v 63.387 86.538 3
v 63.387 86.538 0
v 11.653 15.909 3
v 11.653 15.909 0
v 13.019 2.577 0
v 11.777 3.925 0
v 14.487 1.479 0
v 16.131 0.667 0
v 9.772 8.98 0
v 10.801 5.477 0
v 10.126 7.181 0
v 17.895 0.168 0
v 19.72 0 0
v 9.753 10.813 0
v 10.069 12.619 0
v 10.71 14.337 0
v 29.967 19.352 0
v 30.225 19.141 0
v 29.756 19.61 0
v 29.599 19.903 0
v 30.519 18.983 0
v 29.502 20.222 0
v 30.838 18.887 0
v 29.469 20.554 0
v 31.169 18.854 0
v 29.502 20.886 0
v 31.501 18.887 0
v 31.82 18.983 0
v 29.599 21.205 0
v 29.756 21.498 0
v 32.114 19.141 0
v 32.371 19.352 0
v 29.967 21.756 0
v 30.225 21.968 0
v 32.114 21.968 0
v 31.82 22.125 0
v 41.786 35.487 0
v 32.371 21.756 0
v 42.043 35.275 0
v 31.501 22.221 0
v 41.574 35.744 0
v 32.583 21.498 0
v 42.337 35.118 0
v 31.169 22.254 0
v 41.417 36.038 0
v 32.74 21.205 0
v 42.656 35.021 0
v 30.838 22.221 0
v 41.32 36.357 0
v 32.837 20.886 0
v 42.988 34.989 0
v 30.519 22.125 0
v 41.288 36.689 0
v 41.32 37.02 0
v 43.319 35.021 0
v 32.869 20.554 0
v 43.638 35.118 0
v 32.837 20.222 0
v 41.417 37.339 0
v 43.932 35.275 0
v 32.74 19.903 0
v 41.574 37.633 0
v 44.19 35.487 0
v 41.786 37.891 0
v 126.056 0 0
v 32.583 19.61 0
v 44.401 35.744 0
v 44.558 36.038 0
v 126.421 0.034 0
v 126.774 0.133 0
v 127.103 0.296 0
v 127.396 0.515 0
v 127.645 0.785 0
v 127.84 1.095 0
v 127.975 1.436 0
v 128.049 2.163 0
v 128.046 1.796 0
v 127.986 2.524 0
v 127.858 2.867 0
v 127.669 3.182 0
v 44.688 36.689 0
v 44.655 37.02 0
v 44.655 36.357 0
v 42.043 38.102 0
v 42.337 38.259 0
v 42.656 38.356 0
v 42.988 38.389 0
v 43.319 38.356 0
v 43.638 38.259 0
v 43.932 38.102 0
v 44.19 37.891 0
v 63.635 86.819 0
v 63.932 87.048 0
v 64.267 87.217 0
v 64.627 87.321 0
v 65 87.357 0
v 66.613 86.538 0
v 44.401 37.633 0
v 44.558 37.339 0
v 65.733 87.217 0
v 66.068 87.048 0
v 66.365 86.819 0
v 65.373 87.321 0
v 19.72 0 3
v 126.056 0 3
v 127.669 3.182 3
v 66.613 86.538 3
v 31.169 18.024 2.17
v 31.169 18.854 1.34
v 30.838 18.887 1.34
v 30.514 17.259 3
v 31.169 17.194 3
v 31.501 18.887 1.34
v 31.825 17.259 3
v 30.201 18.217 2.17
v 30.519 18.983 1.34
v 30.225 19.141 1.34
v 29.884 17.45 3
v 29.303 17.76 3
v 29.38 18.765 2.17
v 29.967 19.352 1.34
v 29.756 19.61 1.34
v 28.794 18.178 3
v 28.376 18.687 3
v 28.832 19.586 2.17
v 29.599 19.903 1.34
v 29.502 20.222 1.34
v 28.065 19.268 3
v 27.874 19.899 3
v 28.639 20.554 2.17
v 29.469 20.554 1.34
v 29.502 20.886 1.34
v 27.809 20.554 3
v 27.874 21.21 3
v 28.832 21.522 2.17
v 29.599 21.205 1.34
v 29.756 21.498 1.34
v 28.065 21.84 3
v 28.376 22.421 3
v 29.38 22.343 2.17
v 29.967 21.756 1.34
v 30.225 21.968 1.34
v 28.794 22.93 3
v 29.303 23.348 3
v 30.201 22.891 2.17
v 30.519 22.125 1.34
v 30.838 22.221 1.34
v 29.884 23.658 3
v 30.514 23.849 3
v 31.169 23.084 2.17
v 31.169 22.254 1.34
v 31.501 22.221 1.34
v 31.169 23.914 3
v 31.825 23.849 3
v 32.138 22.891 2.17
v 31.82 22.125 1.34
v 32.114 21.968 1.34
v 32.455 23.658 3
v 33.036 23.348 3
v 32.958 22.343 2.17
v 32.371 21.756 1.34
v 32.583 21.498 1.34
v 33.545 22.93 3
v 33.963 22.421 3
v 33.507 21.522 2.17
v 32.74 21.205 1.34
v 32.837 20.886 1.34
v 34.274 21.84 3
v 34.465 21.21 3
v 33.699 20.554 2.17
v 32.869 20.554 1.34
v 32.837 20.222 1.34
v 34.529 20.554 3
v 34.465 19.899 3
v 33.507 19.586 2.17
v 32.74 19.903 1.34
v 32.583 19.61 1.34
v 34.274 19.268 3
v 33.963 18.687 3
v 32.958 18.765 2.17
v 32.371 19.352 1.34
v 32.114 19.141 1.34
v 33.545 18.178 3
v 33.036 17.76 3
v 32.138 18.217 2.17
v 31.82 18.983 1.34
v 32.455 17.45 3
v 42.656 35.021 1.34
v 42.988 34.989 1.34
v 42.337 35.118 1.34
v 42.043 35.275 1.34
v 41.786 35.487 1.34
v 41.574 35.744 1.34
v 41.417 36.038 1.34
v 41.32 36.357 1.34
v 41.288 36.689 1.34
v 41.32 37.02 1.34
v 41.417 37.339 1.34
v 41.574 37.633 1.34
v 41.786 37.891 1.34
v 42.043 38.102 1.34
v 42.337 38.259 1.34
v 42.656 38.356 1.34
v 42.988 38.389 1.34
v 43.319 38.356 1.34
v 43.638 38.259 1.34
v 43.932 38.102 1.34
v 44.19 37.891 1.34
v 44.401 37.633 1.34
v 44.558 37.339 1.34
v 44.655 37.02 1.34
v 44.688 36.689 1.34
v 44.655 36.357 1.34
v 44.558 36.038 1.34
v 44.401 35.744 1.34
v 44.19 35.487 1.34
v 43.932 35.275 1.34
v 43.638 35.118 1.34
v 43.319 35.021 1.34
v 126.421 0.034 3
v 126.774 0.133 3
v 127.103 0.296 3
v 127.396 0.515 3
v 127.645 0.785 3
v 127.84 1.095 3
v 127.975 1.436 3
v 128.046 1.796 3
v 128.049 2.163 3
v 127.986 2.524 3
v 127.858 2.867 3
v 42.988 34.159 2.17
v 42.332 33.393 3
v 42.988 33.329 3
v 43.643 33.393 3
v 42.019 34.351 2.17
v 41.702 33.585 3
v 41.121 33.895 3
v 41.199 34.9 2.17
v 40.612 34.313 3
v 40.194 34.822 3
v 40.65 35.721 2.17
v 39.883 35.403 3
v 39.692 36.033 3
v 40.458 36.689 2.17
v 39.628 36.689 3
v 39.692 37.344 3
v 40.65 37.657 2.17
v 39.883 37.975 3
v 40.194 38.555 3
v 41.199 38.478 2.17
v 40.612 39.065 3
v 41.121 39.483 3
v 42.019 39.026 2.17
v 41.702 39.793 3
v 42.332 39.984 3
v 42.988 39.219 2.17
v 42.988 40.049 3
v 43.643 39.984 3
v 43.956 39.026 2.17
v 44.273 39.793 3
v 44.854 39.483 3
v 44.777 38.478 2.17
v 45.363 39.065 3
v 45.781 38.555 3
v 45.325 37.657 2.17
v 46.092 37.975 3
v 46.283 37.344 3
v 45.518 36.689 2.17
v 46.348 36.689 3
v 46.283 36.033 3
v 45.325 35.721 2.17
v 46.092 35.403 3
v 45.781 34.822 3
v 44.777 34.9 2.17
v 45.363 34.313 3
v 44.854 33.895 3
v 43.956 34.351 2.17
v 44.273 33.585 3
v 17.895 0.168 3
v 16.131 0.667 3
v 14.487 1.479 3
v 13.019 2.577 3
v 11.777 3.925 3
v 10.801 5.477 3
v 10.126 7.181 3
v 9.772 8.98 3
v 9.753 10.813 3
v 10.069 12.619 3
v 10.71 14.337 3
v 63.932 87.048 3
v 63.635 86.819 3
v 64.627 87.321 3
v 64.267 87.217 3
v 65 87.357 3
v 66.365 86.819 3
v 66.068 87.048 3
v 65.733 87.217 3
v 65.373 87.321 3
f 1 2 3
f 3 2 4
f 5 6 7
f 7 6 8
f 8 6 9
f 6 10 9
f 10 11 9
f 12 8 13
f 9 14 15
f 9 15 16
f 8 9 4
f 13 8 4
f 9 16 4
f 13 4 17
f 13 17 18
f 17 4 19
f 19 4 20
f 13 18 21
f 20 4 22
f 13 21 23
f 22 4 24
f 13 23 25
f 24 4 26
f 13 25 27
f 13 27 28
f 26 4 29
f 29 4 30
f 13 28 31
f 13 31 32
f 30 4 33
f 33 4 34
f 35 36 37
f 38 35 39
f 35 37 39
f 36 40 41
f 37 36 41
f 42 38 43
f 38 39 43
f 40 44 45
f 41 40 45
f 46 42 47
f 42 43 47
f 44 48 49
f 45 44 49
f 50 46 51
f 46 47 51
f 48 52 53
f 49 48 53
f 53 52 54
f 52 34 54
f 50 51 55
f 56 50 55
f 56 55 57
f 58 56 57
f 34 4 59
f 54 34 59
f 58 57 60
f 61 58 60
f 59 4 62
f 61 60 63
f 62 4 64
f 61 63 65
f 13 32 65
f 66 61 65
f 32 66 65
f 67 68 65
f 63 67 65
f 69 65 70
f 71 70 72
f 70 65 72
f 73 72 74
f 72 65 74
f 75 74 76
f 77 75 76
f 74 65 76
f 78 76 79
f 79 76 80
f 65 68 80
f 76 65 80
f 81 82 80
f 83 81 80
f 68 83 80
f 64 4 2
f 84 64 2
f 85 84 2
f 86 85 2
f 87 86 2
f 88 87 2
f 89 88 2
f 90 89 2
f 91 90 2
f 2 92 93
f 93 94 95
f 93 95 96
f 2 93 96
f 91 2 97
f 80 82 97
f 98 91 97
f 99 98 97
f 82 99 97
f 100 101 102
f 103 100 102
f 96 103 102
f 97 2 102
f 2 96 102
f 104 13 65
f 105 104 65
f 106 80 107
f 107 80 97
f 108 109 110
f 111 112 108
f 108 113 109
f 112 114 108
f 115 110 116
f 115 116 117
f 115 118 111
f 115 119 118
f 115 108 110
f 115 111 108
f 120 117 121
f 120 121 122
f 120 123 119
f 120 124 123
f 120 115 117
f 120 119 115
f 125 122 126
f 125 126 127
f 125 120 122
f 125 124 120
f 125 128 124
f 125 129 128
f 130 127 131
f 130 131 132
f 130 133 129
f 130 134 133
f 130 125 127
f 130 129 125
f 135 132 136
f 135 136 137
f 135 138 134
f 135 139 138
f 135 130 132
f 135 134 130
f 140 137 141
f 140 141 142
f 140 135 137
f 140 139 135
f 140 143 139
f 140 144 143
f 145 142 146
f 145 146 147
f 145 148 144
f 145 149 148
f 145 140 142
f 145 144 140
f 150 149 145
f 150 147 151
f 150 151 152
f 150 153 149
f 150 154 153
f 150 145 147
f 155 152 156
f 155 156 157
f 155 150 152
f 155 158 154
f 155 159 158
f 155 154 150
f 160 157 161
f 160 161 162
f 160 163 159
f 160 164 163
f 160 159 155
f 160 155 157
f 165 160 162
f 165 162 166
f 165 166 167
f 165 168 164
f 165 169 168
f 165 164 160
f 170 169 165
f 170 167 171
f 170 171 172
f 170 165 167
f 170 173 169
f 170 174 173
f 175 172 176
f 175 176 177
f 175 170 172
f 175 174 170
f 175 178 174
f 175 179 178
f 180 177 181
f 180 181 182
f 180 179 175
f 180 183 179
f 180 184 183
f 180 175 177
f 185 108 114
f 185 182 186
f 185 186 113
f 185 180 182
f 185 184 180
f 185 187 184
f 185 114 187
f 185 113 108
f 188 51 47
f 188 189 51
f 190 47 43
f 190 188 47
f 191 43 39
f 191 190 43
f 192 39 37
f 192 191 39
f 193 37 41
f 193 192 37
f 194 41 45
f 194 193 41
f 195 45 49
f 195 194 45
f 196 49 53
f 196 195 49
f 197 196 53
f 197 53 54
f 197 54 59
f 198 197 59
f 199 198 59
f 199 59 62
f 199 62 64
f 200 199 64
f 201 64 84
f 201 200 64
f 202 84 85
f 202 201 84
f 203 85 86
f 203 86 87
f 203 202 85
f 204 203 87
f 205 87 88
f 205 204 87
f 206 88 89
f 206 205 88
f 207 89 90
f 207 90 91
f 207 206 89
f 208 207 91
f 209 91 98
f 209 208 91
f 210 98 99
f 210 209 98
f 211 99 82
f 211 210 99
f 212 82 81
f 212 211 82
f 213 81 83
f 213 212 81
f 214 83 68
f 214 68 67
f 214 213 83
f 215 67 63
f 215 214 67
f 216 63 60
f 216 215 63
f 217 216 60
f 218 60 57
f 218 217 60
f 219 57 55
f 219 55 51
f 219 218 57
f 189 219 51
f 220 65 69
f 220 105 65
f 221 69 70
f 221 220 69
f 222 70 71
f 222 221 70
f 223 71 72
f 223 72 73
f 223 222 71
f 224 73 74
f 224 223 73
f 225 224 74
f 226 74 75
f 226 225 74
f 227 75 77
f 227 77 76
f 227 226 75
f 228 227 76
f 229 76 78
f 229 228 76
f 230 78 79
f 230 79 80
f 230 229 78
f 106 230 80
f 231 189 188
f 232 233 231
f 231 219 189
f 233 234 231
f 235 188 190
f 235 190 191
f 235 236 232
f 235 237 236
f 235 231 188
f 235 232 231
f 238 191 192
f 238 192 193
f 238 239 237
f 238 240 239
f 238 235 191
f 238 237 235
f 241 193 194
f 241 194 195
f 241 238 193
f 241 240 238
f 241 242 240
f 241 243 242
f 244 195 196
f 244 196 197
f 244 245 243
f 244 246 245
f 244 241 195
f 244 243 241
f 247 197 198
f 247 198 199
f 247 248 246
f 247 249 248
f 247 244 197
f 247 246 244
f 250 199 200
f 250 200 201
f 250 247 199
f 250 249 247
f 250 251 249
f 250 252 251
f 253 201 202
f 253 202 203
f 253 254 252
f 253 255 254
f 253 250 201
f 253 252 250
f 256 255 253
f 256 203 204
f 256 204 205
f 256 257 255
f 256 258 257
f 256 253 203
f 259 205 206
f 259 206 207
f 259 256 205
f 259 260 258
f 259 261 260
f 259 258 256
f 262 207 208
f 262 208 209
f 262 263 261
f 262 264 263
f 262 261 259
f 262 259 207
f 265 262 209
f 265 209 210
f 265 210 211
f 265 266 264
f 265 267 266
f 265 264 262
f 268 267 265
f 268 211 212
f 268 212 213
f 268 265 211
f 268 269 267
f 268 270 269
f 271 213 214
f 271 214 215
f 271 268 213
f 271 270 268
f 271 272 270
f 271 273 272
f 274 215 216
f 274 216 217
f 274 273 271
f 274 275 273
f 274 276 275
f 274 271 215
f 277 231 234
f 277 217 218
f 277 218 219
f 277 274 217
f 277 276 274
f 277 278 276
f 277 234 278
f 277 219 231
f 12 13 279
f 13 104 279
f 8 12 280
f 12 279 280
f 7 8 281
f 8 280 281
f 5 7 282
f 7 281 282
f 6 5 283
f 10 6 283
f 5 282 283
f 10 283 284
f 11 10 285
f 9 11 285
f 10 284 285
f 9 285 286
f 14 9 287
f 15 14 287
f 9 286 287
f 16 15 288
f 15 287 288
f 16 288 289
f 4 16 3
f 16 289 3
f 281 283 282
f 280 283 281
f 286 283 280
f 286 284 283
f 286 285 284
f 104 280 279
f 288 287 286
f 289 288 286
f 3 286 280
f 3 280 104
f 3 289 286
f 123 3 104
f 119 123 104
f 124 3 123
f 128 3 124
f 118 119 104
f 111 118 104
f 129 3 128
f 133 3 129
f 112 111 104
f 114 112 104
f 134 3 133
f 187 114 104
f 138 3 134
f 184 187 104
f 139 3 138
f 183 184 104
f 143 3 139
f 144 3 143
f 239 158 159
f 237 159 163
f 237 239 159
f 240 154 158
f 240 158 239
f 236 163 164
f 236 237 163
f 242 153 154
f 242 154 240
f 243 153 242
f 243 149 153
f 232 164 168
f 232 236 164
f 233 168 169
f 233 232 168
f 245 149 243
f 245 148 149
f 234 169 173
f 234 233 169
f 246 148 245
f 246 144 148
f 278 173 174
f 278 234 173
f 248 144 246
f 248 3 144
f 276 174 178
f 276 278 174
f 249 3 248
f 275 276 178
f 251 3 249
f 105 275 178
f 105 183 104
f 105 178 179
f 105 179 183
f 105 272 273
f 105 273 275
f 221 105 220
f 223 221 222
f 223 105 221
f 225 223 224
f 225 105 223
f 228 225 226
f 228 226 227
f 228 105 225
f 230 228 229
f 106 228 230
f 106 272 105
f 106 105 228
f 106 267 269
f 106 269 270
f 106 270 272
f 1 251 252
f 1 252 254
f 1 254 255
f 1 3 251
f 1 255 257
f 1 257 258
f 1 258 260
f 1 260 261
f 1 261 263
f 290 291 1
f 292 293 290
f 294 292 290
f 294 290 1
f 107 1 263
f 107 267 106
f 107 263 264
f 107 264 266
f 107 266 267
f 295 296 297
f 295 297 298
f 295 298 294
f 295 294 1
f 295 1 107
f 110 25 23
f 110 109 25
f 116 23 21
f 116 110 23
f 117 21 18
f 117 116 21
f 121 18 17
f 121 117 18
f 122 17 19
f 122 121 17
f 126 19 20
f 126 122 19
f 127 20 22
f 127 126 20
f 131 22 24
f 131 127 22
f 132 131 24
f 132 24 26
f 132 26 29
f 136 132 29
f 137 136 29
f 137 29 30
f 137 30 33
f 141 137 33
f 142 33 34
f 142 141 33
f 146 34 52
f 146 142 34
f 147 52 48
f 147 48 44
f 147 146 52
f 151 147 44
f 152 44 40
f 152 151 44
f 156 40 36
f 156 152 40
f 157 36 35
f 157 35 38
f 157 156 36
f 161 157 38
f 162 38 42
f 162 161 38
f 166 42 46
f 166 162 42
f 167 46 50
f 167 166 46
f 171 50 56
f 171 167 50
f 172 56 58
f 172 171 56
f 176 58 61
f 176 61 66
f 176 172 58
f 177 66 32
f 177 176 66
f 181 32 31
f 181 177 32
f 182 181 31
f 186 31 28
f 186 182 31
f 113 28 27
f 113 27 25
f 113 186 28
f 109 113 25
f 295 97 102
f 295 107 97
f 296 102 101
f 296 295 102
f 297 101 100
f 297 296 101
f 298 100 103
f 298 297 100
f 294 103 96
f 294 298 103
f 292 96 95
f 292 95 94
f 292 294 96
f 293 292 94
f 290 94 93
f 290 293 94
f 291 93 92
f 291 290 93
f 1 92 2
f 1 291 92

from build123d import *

# Parameters (mm, degrees)
EXTRUDE_1_DEPTH             = 3
SKETCH_2_R                  = 1.5
CUT_EXTRUDE_1_DEPTH         = 158.429349233
FILLET_1_R                  = 10
FILLET_2_R                  = 2
HOLE_WIZARD_M3_1_AT_2_COUNT = 2
HOLE_WIZARD_M3_1_AT_2_PITCH = 20


with BuildPart() as part:
    # 草图1 → 凸台-拉伸1 (new body)
    with BuildSketch(Plane.XY):
        Polygon((0, 0), (130, 0), (65, 88.741196746), align=None)
    extrude(amount=EXTRUDE_1_DEPTH)

    # 草图2 → 切除-拉伸1 (cut, through all)
    with BuildSketch(Plane.XY.offset(3)):
        with Locations((42.987595979, 36.688780191)):
            Circle(SKETCH_2_R)
        with Locations(Location((31.169414161, 20.554017147, 0), (0, 0, 180))):
            Circle(SKETCH_2_R)
    extrude(amount=-CUT_EXTRUDE_1_DEPTH, mode=Mode.SUBTRACT)

    # 圆角1
    fillet_1_edges = [part.edges().sort_by_distance(p)[0] for p in [
        (0, 0, 1.5),
    ]]
    fillet(fillet_1_edges, radius=FILLET_1_R)

    # 圆角2
    fillet_2_edges = [part.edges().sort_by_distance(p)[0] for p in [
        (65, 88.741196746, 1.5),
        (130, 0, 1.5),
    ]]
    fillet(fillet_2_edges, radius=FILLET_2_R)

    # 草图6 → M3 六角凹锥坑螺钉的锥形沉头孔1 (revolve, cut)
    with BuildSketch(Plane(origin=(42.987595979, 36.688780191, 3), x_dir=(0, -1, 0), z_dir=(1, 0, 0))):
        Polygon((0, 0), (0, 3), (1.7, 3), (1.7, 1.66), (3.36, 0), align=None)
    hole_wizard_m3_1 = revolve(axis=Axis((42.987595979, 36.688780191, 9.35), (0, 0, -1)), mode=Mode.SUBTRACT)

    # M3 六角凹锥坑螺钉的锥形沉头孔1 at 2: M3 六角凹锥坑螺钉的锥形沉头孔1 ×2
    with Locations(*[Vector(-0.5909090909090912, -0.8067381522408567, 0) * (i * HOLE_WIZARD_M3_1_AT_2_PITCH) for i in range(1, HOLE_WIZARD_M3_1_AT_2_COUNT)]):
        add(hole_wizard_m3_1, mode=Mode.SUBTRACT)


solid = part.part
